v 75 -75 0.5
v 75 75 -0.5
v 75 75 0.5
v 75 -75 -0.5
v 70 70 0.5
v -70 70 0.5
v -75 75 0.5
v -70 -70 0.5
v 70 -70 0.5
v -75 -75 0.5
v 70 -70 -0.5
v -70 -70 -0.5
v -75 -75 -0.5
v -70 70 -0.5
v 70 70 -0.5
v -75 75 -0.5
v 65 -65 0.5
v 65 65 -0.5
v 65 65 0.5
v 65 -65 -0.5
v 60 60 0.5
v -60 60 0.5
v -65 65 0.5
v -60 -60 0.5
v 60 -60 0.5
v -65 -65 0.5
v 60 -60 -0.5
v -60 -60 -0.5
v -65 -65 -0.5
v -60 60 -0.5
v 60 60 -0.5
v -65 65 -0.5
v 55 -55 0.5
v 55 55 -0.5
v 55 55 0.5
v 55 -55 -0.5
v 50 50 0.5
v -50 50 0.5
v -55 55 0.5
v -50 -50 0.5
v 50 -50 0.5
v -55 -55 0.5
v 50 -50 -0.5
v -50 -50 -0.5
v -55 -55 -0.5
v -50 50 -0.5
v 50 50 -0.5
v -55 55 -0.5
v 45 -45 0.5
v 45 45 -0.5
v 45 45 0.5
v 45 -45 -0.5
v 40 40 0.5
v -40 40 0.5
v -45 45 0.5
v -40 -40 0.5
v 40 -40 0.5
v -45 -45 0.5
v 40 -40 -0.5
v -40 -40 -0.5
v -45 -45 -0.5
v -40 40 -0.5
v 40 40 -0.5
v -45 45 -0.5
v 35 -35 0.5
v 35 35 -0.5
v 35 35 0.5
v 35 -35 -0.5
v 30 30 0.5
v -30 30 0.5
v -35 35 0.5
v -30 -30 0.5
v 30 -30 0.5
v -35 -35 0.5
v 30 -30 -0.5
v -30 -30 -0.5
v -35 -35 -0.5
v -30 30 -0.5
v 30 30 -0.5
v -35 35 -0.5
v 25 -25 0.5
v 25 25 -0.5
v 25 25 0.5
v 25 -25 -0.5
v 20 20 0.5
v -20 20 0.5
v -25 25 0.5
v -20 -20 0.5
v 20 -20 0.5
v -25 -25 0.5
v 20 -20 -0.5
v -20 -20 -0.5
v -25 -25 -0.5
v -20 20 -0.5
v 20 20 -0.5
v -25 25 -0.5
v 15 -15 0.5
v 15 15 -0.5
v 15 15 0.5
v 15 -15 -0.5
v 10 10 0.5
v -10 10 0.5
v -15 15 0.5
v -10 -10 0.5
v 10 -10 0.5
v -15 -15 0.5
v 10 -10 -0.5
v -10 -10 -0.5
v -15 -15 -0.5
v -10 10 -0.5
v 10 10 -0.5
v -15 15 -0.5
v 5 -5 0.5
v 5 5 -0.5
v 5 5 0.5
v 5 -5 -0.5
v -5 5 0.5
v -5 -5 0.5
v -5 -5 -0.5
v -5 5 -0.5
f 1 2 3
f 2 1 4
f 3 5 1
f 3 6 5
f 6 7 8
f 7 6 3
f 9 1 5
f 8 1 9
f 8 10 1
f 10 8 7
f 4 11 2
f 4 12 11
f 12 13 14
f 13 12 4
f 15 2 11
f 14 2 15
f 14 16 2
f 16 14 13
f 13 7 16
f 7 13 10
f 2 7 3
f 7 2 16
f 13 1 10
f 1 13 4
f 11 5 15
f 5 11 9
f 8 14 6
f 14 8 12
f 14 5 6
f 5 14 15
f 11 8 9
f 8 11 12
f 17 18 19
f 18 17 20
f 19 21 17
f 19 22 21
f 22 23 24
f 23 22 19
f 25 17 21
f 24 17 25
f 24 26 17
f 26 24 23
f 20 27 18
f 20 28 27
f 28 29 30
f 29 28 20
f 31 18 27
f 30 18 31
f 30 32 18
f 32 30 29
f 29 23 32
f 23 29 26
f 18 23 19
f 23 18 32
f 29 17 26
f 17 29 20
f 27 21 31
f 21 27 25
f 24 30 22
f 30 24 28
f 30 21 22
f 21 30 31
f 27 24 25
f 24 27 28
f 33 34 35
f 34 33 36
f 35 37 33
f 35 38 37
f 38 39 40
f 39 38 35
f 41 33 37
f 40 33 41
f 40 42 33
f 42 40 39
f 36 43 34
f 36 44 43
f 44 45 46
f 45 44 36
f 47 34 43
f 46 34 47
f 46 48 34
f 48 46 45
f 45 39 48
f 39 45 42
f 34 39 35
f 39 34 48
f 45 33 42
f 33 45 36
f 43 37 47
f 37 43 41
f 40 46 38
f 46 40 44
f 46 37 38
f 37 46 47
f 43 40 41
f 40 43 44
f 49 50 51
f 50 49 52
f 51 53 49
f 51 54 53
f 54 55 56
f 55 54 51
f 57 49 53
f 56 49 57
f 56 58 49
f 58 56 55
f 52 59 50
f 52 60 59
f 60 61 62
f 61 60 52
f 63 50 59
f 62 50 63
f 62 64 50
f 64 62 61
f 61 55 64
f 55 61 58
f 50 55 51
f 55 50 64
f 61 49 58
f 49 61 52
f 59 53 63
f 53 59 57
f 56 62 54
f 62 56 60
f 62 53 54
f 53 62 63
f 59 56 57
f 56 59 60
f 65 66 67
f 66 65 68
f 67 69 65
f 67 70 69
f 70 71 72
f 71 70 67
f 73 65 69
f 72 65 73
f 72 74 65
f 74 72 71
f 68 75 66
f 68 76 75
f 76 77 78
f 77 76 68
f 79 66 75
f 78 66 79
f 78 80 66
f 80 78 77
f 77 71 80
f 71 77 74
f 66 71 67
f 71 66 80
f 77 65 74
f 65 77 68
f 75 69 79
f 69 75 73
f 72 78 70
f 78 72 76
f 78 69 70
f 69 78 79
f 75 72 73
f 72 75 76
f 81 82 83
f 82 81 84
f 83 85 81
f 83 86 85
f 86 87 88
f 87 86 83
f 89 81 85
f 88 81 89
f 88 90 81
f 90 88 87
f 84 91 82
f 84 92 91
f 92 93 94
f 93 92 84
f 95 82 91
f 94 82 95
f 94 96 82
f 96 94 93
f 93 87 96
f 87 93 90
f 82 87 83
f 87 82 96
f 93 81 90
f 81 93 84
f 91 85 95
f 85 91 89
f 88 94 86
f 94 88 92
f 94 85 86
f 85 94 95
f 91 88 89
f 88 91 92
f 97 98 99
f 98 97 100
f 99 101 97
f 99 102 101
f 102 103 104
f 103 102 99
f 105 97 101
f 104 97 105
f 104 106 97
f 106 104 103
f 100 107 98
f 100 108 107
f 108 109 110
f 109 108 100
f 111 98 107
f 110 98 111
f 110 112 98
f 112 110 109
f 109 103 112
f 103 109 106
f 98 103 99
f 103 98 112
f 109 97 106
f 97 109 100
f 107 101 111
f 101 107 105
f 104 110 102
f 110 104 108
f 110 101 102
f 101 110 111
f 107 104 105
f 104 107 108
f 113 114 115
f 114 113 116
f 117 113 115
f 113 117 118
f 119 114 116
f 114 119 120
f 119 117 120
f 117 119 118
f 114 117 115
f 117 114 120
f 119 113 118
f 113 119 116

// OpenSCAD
for (i = [0:7]) {
  difference() {
    cube([150 - 20 * i, 150 - 20 * i, 1], center = true);
    cube([140 - 20 * i, 140 - 20 * i, 2], center = true);
  }
 }
